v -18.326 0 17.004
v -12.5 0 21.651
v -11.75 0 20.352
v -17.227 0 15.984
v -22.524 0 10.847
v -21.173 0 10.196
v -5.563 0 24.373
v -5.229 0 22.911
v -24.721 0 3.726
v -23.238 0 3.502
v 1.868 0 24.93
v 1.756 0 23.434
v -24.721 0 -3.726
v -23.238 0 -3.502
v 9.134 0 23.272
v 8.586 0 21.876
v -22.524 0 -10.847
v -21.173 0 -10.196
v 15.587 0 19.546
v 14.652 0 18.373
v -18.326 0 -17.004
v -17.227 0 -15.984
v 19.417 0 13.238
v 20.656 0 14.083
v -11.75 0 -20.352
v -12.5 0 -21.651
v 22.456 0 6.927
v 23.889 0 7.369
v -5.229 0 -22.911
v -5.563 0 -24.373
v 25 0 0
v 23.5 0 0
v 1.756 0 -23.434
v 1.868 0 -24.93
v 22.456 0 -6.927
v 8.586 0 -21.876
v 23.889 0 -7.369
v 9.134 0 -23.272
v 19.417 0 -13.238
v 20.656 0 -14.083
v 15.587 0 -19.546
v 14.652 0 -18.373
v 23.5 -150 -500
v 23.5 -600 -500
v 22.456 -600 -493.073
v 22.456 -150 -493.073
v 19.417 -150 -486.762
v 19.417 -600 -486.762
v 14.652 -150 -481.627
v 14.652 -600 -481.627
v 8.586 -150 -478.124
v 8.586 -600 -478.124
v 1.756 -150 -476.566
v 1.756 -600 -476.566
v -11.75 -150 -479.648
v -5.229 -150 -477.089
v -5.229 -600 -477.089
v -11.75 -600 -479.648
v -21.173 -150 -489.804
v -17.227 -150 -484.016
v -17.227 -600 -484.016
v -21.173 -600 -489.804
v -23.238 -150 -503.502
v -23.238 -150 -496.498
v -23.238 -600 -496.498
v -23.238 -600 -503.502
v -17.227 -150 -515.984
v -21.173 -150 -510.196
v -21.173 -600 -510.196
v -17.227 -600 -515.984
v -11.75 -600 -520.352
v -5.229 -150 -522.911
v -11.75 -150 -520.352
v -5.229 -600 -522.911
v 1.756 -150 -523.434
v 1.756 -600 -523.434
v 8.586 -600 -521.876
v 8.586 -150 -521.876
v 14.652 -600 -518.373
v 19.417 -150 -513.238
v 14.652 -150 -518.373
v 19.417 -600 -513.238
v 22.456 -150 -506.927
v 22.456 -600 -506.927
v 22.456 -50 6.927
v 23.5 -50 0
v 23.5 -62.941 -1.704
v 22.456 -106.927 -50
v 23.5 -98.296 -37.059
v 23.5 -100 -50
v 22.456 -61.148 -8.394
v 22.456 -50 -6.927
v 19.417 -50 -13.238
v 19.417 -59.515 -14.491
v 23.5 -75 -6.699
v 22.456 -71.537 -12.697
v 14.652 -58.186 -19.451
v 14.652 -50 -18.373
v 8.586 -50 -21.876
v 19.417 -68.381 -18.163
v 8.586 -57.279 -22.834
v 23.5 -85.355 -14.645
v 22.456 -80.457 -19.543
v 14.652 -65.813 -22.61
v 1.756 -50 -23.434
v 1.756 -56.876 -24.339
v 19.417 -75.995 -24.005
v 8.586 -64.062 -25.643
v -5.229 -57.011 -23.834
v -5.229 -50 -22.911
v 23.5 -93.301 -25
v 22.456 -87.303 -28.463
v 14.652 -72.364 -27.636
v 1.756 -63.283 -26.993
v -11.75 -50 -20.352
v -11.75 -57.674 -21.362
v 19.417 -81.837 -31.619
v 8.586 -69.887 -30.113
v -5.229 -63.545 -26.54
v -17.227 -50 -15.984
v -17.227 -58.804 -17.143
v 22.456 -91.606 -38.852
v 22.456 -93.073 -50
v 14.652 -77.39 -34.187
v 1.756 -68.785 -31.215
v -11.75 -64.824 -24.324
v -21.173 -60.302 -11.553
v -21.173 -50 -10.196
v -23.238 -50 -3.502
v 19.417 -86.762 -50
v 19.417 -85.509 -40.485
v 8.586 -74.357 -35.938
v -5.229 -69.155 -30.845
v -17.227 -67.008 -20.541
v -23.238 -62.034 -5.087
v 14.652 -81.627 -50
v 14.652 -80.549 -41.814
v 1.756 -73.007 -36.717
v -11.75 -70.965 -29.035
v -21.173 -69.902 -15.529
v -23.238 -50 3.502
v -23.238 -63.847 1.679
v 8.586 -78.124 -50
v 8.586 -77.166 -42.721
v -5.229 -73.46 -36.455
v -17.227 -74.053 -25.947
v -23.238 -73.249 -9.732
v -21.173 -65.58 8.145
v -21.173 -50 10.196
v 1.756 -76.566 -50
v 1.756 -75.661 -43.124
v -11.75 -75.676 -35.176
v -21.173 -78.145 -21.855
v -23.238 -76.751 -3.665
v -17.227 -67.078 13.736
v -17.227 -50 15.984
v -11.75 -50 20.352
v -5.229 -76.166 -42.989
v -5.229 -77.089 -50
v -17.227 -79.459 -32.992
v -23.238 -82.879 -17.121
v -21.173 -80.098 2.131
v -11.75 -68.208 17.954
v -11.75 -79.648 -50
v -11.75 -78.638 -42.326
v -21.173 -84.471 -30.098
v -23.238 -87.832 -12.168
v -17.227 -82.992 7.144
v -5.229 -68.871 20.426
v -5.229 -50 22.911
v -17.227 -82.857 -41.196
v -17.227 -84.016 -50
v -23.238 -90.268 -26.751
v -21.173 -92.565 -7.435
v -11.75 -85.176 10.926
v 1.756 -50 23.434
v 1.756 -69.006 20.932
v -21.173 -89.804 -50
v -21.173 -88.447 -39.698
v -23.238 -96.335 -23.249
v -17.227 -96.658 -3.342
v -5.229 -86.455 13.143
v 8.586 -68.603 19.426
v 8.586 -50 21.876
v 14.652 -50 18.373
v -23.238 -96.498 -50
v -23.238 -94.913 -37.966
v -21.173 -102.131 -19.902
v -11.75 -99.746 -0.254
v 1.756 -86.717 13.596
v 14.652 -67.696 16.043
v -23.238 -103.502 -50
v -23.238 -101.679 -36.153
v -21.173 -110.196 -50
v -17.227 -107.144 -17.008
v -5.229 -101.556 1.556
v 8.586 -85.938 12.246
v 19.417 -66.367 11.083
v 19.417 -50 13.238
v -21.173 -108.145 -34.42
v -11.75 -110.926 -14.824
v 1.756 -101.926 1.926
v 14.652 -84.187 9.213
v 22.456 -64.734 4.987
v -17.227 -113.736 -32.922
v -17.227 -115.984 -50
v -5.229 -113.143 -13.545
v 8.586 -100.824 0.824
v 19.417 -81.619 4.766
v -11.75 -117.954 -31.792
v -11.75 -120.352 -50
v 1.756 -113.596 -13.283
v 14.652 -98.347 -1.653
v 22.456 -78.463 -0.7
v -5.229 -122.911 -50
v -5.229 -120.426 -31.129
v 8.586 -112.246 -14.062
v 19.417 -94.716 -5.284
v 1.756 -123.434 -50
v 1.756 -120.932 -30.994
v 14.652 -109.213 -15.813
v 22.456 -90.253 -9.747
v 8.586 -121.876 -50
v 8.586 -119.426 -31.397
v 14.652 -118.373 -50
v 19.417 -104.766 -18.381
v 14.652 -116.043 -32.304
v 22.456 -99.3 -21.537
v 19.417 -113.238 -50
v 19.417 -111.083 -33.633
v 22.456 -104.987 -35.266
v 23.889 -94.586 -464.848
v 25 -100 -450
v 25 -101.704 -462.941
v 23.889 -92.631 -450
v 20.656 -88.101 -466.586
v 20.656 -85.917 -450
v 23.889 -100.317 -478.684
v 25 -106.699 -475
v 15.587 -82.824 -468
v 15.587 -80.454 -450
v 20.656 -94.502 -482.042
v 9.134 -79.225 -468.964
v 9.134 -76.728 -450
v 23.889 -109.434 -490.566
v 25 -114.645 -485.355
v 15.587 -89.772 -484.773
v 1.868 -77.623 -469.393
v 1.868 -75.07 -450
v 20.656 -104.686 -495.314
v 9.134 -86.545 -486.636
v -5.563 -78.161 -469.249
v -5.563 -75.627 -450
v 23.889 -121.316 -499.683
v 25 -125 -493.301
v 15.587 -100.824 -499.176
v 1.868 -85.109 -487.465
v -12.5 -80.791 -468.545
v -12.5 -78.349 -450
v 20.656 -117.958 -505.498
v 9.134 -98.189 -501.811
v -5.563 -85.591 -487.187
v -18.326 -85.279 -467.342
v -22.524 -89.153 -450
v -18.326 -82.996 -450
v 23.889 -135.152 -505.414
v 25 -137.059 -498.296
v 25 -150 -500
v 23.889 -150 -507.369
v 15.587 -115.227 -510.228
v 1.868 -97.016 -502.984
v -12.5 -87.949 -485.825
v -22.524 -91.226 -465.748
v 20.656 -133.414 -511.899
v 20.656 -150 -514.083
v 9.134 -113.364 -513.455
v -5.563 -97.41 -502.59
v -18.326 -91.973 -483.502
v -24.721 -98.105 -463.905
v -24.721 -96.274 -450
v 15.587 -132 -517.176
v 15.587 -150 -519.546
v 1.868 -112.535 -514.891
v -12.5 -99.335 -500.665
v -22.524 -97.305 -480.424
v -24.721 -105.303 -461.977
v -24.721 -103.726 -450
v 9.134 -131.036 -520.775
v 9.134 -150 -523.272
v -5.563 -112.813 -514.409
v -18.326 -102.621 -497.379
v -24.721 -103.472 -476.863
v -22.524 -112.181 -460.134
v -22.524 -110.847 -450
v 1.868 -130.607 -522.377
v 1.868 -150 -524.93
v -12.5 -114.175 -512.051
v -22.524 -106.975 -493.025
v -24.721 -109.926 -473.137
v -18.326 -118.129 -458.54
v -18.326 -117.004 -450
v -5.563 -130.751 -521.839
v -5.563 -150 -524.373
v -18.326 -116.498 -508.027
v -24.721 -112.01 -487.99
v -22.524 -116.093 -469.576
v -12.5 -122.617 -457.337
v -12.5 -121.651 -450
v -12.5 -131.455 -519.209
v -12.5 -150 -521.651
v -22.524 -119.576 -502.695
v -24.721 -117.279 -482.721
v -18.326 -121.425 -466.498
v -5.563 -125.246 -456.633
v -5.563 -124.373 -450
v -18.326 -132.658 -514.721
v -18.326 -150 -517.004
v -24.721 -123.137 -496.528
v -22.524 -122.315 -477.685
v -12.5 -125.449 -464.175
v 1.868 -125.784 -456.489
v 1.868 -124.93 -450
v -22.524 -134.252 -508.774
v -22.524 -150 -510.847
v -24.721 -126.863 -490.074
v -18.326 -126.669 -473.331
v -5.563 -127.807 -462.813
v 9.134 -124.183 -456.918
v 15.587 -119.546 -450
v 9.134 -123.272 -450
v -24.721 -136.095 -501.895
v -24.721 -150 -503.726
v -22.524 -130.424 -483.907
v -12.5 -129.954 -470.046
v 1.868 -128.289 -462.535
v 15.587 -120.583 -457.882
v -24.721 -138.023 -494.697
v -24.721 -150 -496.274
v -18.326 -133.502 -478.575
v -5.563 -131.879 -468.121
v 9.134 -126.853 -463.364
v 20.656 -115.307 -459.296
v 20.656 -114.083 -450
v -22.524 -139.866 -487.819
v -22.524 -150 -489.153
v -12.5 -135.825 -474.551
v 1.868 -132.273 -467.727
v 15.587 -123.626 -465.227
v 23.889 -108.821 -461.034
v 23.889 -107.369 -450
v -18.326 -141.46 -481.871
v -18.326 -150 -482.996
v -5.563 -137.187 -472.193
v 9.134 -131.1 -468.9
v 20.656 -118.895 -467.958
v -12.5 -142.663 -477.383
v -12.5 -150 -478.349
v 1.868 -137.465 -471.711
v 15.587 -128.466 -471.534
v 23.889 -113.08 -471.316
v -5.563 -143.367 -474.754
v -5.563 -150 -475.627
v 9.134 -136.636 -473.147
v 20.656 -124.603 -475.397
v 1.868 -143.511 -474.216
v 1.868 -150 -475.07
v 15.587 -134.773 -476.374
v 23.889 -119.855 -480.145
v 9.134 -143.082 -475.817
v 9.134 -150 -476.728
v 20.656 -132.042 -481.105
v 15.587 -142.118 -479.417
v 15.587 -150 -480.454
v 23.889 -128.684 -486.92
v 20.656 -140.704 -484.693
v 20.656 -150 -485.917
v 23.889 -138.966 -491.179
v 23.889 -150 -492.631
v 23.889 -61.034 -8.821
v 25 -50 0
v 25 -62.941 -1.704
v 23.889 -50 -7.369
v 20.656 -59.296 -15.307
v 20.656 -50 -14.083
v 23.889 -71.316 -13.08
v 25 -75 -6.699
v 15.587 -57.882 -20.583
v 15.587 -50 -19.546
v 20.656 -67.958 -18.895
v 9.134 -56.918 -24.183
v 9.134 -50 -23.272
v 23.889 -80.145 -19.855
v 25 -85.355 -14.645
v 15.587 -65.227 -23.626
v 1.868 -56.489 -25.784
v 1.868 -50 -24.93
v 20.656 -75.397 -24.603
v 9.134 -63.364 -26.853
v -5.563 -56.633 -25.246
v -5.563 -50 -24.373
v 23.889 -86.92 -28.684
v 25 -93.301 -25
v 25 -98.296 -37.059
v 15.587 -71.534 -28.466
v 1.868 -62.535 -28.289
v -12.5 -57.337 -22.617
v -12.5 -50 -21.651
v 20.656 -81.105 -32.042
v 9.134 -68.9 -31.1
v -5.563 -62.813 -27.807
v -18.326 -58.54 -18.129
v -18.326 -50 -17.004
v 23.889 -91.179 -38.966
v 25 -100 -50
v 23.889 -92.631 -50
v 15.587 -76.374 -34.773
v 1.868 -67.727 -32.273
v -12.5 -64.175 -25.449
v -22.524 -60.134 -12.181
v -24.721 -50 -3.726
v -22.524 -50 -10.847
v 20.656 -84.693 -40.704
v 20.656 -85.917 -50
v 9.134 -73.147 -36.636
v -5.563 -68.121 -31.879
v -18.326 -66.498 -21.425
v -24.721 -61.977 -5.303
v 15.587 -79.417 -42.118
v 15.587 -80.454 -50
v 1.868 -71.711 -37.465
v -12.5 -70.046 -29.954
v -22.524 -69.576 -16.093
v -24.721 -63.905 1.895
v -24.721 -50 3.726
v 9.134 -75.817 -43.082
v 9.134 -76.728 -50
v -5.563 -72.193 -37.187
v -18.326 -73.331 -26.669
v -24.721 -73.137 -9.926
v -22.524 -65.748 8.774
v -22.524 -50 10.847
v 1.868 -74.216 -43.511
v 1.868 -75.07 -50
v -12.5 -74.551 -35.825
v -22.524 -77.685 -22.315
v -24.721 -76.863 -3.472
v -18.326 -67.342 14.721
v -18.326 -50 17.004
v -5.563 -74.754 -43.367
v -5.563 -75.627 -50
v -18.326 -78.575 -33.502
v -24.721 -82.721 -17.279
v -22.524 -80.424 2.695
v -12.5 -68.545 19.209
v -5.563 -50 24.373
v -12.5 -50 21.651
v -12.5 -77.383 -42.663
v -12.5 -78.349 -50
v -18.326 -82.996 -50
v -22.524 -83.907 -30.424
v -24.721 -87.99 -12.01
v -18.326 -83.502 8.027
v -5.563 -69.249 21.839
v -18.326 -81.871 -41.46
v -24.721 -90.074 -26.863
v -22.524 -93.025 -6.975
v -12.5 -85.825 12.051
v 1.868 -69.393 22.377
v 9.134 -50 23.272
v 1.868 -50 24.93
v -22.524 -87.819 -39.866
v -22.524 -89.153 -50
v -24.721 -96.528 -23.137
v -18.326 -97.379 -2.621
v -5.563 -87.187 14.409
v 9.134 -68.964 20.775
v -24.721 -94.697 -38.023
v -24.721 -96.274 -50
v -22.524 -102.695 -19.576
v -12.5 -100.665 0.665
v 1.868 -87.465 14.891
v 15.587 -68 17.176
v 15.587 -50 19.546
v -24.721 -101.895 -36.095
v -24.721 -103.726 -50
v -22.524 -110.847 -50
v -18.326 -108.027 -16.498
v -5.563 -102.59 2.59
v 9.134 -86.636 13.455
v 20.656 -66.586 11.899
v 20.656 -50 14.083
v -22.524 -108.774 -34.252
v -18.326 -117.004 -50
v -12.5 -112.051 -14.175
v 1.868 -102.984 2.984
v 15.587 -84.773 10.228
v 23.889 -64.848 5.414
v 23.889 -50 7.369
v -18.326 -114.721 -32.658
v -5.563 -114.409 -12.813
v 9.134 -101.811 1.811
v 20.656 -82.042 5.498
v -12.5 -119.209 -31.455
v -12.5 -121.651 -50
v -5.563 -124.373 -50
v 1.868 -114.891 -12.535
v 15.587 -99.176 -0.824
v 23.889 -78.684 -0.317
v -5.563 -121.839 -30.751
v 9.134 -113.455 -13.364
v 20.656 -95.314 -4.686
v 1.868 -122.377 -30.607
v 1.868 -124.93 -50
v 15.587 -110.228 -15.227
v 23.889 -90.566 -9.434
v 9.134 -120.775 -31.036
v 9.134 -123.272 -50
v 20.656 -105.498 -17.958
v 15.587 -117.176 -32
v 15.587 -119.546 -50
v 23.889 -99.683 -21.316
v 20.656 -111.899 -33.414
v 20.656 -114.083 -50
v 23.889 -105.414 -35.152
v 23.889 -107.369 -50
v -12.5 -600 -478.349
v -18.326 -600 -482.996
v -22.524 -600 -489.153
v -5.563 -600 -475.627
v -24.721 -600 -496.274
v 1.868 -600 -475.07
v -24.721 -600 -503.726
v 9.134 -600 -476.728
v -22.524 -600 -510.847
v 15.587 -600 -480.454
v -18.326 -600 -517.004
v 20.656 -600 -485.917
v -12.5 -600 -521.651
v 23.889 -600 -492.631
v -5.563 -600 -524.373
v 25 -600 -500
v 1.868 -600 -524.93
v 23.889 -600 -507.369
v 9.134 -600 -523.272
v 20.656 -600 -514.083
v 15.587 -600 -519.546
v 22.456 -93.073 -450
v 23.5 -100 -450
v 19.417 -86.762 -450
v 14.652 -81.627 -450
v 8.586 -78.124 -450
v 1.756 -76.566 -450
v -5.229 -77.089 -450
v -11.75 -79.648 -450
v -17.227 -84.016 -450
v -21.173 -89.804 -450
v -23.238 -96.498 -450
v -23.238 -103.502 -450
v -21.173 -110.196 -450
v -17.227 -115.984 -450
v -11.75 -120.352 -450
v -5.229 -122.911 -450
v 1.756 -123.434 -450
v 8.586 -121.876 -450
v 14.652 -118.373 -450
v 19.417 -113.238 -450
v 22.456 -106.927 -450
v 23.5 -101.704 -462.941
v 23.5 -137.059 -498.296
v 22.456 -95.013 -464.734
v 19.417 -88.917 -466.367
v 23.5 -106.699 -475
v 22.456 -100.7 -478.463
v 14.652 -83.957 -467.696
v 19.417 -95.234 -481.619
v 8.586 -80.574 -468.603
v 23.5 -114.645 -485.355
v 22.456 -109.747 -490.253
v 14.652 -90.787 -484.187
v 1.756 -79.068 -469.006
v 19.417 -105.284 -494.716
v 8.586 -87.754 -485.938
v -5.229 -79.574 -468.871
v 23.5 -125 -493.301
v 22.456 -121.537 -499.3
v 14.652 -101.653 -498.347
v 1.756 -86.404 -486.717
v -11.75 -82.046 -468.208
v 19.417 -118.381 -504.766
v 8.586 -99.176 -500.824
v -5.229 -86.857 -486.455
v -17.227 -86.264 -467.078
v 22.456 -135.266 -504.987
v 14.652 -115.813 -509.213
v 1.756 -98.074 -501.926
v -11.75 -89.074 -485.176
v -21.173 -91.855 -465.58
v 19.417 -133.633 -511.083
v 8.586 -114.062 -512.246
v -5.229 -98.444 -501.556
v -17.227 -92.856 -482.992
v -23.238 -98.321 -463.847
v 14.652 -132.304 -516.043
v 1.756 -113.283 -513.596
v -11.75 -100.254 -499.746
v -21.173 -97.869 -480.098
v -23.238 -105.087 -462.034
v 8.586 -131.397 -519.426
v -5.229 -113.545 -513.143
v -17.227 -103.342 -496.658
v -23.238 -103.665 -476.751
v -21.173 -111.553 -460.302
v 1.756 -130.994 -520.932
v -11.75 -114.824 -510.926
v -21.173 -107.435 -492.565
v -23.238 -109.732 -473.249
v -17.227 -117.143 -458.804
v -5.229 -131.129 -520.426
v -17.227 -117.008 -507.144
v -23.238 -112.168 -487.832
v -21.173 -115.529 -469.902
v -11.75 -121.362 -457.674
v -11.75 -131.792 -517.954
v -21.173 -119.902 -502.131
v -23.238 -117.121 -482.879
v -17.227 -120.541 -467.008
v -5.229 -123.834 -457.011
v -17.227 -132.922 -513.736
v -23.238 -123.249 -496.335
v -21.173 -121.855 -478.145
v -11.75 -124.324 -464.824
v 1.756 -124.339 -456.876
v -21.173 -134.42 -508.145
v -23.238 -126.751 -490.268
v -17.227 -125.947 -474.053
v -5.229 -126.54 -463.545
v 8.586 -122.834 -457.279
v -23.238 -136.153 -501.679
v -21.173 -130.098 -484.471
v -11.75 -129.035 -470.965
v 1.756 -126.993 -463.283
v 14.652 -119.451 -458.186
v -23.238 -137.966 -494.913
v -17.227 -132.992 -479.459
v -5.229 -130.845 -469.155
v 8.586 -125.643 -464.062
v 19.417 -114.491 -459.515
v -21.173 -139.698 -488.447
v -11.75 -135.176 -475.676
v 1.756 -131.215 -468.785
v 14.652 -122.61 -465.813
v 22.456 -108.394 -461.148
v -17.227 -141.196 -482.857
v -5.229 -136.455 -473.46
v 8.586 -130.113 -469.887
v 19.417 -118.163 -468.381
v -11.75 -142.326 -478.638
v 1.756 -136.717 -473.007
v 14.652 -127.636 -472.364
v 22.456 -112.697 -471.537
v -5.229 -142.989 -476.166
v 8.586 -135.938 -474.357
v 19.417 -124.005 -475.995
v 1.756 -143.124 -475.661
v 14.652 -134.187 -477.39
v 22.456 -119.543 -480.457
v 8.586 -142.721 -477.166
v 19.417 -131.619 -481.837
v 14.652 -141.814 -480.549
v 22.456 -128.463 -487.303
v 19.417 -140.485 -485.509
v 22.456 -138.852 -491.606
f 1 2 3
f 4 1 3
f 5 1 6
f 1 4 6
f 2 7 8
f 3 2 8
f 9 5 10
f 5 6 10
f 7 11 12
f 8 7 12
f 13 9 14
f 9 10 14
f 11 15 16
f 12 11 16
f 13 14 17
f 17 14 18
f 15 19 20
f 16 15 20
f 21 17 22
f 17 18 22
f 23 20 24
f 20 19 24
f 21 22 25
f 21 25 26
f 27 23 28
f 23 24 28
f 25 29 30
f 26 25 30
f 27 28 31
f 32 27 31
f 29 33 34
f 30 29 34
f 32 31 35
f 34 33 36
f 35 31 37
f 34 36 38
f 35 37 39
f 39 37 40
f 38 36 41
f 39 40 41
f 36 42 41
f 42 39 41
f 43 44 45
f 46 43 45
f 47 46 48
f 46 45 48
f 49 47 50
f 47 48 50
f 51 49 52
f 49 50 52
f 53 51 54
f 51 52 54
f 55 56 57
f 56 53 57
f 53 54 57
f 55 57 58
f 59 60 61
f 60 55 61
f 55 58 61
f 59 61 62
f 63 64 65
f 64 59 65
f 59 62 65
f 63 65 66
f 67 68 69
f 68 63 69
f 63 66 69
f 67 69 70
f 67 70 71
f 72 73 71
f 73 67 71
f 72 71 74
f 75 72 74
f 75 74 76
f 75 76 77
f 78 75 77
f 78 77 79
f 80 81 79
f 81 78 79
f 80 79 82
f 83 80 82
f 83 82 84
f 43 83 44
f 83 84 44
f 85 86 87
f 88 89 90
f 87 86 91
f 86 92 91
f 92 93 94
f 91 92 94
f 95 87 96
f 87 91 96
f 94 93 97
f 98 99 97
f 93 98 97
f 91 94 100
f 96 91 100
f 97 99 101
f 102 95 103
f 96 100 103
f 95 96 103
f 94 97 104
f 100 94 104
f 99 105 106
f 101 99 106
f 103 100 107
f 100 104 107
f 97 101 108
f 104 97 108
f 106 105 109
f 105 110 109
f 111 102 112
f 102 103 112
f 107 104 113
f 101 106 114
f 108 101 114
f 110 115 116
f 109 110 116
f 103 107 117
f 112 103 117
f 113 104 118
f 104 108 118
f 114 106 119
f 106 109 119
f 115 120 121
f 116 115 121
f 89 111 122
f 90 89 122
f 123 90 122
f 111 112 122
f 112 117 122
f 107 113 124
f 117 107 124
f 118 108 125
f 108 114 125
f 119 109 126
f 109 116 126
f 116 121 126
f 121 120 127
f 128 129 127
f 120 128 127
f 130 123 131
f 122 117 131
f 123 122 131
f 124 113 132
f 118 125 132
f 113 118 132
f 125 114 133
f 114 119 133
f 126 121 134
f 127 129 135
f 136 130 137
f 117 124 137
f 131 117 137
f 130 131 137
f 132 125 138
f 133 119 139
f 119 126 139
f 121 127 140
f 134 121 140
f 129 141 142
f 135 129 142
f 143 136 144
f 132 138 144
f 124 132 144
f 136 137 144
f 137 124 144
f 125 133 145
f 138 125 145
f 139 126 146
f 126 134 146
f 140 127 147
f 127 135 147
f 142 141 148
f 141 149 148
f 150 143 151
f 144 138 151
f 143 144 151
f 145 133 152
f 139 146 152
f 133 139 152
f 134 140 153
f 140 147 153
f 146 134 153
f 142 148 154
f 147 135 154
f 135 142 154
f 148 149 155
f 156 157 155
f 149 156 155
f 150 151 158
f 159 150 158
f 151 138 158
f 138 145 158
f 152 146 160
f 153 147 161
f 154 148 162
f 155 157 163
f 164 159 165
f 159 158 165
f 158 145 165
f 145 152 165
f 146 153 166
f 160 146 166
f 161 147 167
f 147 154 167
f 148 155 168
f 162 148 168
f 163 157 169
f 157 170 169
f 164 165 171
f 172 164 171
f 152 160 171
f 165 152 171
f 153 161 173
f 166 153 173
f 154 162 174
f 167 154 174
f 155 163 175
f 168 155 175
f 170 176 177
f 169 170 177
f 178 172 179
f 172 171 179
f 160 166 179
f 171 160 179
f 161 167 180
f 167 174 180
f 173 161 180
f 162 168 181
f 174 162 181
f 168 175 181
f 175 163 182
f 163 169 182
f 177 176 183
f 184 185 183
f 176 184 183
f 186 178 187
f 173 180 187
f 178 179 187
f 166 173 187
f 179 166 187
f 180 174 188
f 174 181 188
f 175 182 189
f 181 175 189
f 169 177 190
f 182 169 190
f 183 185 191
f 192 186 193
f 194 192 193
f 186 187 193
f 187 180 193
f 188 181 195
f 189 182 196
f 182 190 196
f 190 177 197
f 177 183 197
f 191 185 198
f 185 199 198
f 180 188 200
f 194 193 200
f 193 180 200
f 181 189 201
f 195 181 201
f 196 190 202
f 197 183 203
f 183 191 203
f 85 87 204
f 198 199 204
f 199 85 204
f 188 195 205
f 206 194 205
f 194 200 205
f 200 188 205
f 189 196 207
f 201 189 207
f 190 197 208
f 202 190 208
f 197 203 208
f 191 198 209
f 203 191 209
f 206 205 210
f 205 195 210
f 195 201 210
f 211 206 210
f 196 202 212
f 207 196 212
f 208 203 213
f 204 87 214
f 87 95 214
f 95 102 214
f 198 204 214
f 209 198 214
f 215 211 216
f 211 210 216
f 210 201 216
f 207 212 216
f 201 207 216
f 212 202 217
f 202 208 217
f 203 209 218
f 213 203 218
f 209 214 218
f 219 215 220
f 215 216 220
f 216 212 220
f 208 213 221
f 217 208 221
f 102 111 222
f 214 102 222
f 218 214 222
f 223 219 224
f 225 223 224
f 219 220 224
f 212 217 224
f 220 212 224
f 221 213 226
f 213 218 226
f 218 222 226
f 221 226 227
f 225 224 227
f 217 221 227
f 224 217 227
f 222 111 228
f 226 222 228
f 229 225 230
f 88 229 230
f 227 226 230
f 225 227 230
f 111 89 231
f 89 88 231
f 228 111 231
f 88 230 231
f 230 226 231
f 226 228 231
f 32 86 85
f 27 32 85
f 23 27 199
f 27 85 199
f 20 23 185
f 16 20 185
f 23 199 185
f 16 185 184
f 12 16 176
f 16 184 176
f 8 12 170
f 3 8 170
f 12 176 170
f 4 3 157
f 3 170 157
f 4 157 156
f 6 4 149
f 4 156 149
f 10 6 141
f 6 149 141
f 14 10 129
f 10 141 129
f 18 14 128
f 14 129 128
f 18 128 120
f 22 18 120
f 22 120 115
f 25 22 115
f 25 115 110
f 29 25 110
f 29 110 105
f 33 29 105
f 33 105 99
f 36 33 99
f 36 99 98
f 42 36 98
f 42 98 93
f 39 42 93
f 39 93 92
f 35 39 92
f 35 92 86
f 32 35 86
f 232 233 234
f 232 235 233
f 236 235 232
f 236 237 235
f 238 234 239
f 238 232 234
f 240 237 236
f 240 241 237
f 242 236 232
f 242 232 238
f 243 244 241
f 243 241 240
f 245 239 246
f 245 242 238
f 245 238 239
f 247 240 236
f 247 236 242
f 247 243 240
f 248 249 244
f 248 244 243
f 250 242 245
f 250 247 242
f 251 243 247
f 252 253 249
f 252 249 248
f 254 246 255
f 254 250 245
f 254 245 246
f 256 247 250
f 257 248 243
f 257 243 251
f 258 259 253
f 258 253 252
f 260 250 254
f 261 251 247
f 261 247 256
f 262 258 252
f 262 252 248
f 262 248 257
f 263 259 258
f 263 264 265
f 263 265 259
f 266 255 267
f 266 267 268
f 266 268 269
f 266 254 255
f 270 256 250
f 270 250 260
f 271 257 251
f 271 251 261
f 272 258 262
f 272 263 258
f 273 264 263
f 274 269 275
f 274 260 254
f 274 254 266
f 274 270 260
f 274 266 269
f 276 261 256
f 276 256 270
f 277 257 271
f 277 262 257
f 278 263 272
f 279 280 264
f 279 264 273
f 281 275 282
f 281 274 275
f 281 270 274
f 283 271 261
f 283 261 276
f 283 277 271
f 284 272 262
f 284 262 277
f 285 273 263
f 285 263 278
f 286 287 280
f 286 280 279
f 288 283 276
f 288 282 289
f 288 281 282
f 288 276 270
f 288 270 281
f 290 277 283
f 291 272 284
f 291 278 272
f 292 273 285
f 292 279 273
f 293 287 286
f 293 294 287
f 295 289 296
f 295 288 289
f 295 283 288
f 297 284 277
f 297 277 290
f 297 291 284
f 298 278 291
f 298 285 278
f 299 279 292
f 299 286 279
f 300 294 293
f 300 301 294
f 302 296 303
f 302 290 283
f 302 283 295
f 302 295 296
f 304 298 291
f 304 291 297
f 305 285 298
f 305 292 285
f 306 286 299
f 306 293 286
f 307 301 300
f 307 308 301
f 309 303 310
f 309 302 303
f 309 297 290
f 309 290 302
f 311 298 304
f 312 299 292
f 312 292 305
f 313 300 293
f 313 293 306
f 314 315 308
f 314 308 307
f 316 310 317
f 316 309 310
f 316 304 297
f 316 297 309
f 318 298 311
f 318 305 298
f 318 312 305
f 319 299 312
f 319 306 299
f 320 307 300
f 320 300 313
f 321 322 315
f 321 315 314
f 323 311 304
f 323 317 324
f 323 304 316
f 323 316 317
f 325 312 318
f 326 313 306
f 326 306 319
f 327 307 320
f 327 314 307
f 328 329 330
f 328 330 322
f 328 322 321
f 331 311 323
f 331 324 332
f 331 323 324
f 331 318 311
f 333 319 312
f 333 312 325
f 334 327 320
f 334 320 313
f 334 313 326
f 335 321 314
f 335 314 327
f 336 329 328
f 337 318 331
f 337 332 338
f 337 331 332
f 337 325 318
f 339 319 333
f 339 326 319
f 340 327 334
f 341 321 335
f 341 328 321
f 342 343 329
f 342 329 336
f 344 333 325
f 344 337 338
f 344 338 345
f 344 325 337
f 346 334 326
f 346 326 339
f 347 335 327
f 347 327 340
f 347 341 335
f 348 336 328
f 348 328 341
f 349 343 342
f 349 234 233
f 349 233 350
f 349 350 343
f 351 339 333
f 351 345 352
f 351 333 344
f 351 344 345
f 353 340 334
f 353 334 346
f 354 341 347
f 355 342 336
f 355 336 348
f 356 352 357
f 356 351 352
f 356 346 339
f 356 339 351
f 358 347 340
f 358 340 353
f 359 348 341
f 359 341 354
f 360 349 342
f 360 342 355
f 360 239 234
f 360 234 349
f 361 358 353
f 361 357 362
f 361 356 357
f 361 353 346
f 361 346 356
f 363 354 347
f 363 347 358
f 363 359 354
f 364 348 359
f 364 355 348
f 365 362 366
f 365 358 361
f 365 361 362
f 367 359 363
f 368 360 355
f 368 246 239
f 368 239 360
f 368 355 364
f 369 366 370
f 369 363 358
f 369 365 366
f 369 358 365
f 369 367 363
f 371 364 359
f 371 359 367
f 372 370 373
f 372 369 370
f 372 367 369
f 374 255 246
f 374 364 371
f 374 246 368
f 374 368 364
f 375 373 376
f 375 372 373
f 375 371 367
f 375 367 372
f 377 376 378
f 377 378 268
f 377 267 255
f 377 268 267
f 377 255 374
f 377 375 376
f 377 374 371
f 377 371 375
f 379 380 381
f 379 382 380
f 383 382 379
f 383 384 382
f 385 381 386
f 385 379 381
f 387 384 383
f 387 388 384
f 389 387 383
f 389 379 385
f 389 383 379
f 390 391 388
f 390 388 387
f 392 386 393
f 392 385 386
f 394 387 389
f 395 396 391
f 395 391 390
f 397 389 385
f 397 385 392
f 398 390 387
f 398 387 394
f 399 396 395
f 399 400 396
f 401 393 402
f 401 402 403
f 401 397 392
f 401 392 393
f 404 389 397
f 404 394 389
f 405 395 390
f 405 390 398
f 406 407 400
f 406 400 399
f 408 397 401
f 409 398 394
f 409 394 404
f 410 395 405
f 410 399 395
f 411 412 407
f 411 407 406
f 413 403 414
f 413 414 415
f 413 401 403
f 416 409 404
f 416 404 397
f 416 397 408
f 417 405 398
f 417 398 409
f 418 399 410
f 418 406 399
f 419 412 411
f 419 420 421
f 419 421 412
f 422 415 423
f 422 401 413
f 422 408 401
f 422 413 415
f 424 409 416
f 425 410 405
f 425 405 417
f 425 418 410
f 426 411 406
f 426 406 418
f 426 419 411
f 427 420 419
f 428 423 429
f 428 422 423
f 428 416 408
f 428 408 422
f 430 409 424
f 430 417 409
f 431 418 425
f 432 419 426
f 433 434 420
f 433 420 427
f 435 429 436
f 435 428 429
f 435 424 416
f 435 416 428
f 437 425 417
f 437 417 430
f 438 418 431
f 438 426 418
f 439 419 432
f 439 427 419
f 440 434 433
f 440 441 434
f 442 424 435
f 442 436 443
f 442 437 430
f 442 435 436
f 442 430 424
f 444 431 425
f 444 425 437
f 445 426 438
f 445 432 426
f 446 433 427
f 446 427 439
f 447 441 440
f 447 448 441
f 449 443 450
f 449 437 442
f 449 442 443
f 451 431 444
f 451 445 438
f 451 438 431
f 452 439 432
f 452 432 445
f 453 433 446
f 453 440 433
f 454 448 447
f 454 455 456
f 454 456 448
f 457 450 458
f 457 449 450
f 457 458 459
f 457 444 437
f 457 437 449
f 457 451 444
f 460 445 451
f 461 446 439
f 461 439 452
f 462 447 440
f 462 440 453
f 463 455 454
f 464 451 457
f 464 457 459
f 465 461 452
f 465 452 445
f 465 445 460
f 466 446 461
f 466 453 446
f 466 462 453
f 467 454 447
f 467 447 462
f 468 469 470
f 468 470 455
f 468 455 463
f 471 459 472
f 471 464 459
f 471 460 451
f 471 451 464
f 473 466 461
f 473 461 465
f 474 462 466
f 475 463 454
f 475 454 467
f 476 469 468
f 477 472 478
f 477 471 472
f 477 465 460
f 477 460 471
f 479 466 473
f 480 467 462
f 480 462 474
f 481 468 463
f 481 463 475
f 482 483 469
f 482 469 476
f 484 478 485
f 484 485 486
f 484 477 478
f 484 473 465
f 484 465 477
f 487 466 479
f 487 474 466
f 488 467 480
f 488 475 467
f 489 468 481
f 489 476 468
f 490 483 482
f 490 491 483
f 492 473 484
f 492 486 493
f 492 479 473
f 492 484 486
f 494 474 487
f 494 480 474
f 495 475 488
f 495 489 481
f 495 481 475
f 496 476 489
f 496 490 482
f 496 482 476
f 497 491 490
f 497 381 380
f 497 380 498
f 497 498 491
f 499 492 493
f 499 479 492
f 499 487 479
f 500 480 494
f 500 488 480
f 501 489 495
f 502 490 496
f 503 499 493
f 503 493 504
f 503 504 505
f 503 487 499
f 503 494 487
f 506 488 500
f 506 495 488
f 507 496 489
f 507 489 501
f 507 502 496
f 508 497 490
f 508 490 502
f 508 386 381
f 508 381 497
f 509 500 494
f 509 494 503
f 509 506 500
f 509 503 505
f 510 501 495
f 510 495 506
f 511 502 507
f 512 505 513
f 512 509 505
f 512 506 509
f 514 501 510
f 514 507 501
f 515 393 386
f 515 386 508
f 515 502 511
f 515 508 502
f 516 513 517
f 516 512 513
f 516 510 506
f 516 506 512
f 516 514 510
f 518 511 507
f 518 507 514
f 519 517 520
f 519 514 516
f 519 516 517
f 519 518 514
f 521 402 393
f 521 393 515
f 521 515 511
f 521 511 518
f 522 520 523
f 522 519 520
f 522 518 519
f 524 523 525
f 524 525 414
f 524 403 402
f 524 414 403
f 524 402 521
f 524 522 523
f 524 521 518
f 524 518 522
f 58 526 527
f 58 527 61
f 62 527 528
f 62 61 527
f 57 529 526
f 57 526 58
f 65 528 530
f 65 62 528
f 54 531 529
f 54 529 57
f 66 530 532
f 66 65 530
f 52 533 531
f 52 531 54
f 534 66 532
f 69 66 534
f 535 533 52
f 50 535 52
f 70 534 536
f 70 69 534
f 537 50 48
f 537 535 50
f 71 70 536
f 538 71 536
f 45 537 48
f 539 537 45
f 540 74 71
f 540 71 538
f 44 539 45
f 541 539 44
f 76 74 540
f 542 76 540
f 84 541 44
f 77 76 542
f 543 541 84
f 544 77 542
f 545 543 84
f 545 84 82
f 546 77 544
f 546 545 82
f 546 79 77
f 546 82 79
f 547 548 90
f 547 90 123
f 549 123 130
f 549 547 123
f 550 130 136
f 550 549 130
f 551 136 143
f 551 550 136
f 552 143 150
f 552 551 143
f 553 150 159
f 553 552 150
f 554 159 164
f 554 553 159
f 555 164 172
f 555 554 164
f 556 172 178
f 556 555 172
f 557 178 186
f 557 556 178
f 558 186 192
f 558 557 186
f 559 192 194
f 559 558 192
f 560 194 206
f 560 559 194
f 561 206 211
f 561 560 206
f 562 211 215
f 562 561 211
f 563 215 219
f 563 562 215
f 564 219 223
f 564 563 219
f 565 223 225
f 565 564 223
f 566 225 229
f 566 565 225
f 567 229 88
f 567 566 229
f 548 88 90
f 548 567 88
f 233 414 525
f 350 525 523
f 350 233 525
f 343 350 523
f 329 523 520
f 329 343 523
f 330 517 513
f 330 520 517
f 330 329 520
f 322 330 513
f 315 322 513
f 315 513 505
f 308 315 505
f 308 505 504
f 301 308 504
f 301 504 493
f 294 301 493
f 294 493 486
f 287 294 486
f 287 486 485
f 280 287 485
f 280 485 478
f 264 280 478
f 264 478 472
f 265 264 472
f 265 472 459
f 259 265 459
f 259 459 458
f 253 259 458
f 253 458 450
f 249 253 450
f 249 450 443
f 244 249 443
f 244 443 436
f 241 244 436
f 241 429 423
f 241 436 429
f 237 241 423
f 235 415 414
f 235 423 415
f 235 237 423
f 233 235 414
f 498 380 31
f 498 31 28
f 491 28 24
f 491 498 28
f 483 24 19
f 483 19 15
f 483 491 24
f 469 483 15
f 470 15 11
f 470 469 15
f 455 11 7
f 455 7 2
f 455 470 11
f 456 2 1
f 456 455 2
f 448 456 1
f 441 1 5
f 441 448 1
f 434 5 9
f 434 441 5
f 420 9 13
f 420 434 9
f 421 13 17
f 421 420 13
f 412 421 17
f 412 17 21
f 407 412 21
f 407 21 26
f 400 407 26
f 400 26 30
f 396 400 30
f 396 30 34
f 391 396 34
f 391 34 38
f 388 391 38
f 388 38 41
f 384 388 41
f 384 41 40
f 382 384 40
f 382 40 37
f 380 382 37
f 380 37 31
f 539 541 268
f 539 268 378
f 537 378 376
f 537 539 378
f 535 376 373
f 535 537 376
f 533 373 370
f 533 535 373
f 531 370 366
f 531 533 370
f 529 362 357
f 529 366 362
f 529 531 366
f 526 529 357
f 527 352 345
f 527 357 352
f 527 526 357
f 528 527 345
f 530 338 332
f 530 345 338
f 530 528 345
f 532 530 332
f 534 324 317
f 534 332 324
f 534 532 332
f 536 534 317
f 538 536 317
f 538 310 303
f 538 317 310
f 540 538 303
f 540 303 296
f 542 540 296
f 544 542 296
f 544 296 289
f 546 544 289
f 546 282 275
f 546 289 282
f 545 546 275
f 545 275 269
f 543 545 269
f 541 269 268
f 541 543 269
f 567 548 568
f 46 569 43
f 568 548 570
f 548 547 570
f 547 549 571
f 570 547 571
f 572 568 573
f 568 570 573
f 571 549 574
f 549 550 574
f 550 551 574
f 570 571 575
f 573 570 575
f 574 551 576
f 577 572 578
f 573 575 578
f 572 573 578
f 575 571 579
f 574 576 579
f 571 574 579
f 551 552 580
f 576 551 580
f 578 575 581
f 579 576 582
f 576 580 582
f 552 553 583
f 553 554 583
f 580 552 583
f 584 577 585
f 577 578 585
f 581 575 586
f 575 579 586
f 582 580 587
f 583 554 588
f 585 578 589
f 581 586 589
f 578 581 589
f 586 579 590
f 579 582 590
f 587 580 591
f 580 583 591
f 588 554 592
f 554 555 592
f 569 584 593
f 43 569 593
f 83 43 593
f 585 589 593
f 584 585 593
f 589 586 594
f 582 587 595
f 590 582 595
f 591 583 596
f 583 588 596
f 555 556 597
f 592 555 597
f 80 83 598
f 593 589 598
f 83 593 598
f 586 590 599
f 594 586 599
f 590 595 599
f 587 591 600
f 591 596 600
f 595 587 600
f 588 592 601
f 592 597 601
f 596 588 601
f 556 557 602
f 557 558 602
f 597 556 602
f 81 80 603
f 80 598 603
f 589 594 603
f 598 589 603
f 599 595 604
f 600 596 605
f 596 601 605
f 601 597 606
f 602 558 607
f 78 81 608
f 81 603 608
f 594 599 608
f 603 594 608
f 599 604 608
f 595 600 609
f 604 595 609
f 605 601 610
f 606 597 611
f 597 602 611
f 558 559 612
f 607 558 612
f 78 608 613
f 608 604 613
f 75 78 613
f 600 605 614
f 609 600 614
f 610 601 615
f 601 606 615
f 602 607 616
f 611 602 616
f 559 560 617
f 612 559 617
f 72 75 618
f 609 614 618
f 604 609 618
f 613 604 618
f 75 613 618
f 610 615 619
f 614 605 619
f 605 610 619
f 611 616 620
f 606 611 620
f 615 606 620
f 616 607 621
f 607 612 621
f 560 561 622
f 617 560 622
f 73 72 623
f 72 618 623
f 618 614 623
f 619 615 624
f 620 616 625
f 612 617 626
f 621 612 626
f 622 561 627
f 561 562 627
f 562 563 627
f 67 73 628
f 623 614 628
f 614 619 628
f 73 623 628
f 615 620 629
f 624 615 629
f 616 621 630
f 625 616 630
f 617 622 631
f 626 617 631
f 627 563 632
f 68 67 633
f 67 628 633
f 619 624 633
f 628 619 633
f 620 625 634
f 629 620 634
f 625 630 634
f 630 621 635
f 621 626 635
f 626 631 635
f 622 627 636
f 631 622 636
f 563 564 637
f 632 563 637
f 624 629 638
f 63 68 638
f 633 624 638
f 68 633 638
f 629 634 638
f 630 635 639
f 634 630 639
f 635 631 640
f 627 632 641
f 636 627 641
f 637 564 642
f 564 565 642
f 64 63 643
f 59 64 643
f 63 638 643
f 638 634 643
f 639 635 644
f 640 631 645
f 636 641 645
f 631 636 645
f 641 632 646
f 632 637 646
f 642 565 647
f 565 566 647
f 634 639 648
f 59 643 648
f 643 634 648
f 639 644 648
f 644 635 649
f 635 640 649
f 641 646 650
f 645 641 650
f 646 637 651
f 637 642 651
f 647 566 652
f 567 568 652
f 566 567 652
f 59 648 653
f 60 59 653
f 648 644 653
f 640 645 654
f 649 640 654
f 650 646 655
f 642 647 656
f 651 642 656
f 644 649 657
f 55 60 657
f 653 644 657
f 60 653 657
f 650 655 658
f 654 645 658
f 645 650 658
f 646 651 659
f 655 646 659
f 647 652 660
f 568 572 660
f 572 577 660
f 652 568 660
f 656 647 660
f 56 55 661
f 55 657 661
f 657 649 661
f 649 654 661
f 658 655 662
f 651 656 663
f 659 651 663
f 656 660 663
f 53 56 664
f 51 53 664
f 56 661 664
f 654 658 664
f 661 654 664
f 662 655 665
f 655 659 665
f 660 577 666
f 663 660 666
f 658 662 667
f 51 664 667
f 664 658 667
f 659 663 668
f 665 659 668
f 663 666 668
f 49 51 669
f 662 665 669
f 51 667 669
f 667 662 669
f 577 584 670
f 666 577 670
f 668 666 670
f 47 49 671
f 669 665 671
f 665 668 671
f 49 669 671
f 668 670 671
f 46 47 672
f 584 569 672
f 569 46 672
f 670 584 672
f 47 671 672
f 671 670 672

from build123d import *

# Parameters (mm, degrees)
F0_R   = 25
F0_R_2 = 23.5


with BuildPart() as f2:
    # F2: sweep along a path in F1
    with BuildLine(Plane.YZ) as f2_path:
        Line((0, 0), (-50, 0))
        ThreePointArc((-50, 0), (-85.355339, -14.644661), (-100, -50))
        Line((-100, -50), (-100, -450))
        ThreePointArc((-100, -450), (-114.644661, -485.355339), (-150, -500))
        Line((-150, -500), (-600, -500))
    # F0 (on Front) → F2 (sweep)
    with BuildSketch(Plane.XZ):
        Circle(F0_R)
        Circle(F0_R_2, mode=Mode.SUBTRACT)
    sweep(path=f2_path.line)


solid = f2.part
